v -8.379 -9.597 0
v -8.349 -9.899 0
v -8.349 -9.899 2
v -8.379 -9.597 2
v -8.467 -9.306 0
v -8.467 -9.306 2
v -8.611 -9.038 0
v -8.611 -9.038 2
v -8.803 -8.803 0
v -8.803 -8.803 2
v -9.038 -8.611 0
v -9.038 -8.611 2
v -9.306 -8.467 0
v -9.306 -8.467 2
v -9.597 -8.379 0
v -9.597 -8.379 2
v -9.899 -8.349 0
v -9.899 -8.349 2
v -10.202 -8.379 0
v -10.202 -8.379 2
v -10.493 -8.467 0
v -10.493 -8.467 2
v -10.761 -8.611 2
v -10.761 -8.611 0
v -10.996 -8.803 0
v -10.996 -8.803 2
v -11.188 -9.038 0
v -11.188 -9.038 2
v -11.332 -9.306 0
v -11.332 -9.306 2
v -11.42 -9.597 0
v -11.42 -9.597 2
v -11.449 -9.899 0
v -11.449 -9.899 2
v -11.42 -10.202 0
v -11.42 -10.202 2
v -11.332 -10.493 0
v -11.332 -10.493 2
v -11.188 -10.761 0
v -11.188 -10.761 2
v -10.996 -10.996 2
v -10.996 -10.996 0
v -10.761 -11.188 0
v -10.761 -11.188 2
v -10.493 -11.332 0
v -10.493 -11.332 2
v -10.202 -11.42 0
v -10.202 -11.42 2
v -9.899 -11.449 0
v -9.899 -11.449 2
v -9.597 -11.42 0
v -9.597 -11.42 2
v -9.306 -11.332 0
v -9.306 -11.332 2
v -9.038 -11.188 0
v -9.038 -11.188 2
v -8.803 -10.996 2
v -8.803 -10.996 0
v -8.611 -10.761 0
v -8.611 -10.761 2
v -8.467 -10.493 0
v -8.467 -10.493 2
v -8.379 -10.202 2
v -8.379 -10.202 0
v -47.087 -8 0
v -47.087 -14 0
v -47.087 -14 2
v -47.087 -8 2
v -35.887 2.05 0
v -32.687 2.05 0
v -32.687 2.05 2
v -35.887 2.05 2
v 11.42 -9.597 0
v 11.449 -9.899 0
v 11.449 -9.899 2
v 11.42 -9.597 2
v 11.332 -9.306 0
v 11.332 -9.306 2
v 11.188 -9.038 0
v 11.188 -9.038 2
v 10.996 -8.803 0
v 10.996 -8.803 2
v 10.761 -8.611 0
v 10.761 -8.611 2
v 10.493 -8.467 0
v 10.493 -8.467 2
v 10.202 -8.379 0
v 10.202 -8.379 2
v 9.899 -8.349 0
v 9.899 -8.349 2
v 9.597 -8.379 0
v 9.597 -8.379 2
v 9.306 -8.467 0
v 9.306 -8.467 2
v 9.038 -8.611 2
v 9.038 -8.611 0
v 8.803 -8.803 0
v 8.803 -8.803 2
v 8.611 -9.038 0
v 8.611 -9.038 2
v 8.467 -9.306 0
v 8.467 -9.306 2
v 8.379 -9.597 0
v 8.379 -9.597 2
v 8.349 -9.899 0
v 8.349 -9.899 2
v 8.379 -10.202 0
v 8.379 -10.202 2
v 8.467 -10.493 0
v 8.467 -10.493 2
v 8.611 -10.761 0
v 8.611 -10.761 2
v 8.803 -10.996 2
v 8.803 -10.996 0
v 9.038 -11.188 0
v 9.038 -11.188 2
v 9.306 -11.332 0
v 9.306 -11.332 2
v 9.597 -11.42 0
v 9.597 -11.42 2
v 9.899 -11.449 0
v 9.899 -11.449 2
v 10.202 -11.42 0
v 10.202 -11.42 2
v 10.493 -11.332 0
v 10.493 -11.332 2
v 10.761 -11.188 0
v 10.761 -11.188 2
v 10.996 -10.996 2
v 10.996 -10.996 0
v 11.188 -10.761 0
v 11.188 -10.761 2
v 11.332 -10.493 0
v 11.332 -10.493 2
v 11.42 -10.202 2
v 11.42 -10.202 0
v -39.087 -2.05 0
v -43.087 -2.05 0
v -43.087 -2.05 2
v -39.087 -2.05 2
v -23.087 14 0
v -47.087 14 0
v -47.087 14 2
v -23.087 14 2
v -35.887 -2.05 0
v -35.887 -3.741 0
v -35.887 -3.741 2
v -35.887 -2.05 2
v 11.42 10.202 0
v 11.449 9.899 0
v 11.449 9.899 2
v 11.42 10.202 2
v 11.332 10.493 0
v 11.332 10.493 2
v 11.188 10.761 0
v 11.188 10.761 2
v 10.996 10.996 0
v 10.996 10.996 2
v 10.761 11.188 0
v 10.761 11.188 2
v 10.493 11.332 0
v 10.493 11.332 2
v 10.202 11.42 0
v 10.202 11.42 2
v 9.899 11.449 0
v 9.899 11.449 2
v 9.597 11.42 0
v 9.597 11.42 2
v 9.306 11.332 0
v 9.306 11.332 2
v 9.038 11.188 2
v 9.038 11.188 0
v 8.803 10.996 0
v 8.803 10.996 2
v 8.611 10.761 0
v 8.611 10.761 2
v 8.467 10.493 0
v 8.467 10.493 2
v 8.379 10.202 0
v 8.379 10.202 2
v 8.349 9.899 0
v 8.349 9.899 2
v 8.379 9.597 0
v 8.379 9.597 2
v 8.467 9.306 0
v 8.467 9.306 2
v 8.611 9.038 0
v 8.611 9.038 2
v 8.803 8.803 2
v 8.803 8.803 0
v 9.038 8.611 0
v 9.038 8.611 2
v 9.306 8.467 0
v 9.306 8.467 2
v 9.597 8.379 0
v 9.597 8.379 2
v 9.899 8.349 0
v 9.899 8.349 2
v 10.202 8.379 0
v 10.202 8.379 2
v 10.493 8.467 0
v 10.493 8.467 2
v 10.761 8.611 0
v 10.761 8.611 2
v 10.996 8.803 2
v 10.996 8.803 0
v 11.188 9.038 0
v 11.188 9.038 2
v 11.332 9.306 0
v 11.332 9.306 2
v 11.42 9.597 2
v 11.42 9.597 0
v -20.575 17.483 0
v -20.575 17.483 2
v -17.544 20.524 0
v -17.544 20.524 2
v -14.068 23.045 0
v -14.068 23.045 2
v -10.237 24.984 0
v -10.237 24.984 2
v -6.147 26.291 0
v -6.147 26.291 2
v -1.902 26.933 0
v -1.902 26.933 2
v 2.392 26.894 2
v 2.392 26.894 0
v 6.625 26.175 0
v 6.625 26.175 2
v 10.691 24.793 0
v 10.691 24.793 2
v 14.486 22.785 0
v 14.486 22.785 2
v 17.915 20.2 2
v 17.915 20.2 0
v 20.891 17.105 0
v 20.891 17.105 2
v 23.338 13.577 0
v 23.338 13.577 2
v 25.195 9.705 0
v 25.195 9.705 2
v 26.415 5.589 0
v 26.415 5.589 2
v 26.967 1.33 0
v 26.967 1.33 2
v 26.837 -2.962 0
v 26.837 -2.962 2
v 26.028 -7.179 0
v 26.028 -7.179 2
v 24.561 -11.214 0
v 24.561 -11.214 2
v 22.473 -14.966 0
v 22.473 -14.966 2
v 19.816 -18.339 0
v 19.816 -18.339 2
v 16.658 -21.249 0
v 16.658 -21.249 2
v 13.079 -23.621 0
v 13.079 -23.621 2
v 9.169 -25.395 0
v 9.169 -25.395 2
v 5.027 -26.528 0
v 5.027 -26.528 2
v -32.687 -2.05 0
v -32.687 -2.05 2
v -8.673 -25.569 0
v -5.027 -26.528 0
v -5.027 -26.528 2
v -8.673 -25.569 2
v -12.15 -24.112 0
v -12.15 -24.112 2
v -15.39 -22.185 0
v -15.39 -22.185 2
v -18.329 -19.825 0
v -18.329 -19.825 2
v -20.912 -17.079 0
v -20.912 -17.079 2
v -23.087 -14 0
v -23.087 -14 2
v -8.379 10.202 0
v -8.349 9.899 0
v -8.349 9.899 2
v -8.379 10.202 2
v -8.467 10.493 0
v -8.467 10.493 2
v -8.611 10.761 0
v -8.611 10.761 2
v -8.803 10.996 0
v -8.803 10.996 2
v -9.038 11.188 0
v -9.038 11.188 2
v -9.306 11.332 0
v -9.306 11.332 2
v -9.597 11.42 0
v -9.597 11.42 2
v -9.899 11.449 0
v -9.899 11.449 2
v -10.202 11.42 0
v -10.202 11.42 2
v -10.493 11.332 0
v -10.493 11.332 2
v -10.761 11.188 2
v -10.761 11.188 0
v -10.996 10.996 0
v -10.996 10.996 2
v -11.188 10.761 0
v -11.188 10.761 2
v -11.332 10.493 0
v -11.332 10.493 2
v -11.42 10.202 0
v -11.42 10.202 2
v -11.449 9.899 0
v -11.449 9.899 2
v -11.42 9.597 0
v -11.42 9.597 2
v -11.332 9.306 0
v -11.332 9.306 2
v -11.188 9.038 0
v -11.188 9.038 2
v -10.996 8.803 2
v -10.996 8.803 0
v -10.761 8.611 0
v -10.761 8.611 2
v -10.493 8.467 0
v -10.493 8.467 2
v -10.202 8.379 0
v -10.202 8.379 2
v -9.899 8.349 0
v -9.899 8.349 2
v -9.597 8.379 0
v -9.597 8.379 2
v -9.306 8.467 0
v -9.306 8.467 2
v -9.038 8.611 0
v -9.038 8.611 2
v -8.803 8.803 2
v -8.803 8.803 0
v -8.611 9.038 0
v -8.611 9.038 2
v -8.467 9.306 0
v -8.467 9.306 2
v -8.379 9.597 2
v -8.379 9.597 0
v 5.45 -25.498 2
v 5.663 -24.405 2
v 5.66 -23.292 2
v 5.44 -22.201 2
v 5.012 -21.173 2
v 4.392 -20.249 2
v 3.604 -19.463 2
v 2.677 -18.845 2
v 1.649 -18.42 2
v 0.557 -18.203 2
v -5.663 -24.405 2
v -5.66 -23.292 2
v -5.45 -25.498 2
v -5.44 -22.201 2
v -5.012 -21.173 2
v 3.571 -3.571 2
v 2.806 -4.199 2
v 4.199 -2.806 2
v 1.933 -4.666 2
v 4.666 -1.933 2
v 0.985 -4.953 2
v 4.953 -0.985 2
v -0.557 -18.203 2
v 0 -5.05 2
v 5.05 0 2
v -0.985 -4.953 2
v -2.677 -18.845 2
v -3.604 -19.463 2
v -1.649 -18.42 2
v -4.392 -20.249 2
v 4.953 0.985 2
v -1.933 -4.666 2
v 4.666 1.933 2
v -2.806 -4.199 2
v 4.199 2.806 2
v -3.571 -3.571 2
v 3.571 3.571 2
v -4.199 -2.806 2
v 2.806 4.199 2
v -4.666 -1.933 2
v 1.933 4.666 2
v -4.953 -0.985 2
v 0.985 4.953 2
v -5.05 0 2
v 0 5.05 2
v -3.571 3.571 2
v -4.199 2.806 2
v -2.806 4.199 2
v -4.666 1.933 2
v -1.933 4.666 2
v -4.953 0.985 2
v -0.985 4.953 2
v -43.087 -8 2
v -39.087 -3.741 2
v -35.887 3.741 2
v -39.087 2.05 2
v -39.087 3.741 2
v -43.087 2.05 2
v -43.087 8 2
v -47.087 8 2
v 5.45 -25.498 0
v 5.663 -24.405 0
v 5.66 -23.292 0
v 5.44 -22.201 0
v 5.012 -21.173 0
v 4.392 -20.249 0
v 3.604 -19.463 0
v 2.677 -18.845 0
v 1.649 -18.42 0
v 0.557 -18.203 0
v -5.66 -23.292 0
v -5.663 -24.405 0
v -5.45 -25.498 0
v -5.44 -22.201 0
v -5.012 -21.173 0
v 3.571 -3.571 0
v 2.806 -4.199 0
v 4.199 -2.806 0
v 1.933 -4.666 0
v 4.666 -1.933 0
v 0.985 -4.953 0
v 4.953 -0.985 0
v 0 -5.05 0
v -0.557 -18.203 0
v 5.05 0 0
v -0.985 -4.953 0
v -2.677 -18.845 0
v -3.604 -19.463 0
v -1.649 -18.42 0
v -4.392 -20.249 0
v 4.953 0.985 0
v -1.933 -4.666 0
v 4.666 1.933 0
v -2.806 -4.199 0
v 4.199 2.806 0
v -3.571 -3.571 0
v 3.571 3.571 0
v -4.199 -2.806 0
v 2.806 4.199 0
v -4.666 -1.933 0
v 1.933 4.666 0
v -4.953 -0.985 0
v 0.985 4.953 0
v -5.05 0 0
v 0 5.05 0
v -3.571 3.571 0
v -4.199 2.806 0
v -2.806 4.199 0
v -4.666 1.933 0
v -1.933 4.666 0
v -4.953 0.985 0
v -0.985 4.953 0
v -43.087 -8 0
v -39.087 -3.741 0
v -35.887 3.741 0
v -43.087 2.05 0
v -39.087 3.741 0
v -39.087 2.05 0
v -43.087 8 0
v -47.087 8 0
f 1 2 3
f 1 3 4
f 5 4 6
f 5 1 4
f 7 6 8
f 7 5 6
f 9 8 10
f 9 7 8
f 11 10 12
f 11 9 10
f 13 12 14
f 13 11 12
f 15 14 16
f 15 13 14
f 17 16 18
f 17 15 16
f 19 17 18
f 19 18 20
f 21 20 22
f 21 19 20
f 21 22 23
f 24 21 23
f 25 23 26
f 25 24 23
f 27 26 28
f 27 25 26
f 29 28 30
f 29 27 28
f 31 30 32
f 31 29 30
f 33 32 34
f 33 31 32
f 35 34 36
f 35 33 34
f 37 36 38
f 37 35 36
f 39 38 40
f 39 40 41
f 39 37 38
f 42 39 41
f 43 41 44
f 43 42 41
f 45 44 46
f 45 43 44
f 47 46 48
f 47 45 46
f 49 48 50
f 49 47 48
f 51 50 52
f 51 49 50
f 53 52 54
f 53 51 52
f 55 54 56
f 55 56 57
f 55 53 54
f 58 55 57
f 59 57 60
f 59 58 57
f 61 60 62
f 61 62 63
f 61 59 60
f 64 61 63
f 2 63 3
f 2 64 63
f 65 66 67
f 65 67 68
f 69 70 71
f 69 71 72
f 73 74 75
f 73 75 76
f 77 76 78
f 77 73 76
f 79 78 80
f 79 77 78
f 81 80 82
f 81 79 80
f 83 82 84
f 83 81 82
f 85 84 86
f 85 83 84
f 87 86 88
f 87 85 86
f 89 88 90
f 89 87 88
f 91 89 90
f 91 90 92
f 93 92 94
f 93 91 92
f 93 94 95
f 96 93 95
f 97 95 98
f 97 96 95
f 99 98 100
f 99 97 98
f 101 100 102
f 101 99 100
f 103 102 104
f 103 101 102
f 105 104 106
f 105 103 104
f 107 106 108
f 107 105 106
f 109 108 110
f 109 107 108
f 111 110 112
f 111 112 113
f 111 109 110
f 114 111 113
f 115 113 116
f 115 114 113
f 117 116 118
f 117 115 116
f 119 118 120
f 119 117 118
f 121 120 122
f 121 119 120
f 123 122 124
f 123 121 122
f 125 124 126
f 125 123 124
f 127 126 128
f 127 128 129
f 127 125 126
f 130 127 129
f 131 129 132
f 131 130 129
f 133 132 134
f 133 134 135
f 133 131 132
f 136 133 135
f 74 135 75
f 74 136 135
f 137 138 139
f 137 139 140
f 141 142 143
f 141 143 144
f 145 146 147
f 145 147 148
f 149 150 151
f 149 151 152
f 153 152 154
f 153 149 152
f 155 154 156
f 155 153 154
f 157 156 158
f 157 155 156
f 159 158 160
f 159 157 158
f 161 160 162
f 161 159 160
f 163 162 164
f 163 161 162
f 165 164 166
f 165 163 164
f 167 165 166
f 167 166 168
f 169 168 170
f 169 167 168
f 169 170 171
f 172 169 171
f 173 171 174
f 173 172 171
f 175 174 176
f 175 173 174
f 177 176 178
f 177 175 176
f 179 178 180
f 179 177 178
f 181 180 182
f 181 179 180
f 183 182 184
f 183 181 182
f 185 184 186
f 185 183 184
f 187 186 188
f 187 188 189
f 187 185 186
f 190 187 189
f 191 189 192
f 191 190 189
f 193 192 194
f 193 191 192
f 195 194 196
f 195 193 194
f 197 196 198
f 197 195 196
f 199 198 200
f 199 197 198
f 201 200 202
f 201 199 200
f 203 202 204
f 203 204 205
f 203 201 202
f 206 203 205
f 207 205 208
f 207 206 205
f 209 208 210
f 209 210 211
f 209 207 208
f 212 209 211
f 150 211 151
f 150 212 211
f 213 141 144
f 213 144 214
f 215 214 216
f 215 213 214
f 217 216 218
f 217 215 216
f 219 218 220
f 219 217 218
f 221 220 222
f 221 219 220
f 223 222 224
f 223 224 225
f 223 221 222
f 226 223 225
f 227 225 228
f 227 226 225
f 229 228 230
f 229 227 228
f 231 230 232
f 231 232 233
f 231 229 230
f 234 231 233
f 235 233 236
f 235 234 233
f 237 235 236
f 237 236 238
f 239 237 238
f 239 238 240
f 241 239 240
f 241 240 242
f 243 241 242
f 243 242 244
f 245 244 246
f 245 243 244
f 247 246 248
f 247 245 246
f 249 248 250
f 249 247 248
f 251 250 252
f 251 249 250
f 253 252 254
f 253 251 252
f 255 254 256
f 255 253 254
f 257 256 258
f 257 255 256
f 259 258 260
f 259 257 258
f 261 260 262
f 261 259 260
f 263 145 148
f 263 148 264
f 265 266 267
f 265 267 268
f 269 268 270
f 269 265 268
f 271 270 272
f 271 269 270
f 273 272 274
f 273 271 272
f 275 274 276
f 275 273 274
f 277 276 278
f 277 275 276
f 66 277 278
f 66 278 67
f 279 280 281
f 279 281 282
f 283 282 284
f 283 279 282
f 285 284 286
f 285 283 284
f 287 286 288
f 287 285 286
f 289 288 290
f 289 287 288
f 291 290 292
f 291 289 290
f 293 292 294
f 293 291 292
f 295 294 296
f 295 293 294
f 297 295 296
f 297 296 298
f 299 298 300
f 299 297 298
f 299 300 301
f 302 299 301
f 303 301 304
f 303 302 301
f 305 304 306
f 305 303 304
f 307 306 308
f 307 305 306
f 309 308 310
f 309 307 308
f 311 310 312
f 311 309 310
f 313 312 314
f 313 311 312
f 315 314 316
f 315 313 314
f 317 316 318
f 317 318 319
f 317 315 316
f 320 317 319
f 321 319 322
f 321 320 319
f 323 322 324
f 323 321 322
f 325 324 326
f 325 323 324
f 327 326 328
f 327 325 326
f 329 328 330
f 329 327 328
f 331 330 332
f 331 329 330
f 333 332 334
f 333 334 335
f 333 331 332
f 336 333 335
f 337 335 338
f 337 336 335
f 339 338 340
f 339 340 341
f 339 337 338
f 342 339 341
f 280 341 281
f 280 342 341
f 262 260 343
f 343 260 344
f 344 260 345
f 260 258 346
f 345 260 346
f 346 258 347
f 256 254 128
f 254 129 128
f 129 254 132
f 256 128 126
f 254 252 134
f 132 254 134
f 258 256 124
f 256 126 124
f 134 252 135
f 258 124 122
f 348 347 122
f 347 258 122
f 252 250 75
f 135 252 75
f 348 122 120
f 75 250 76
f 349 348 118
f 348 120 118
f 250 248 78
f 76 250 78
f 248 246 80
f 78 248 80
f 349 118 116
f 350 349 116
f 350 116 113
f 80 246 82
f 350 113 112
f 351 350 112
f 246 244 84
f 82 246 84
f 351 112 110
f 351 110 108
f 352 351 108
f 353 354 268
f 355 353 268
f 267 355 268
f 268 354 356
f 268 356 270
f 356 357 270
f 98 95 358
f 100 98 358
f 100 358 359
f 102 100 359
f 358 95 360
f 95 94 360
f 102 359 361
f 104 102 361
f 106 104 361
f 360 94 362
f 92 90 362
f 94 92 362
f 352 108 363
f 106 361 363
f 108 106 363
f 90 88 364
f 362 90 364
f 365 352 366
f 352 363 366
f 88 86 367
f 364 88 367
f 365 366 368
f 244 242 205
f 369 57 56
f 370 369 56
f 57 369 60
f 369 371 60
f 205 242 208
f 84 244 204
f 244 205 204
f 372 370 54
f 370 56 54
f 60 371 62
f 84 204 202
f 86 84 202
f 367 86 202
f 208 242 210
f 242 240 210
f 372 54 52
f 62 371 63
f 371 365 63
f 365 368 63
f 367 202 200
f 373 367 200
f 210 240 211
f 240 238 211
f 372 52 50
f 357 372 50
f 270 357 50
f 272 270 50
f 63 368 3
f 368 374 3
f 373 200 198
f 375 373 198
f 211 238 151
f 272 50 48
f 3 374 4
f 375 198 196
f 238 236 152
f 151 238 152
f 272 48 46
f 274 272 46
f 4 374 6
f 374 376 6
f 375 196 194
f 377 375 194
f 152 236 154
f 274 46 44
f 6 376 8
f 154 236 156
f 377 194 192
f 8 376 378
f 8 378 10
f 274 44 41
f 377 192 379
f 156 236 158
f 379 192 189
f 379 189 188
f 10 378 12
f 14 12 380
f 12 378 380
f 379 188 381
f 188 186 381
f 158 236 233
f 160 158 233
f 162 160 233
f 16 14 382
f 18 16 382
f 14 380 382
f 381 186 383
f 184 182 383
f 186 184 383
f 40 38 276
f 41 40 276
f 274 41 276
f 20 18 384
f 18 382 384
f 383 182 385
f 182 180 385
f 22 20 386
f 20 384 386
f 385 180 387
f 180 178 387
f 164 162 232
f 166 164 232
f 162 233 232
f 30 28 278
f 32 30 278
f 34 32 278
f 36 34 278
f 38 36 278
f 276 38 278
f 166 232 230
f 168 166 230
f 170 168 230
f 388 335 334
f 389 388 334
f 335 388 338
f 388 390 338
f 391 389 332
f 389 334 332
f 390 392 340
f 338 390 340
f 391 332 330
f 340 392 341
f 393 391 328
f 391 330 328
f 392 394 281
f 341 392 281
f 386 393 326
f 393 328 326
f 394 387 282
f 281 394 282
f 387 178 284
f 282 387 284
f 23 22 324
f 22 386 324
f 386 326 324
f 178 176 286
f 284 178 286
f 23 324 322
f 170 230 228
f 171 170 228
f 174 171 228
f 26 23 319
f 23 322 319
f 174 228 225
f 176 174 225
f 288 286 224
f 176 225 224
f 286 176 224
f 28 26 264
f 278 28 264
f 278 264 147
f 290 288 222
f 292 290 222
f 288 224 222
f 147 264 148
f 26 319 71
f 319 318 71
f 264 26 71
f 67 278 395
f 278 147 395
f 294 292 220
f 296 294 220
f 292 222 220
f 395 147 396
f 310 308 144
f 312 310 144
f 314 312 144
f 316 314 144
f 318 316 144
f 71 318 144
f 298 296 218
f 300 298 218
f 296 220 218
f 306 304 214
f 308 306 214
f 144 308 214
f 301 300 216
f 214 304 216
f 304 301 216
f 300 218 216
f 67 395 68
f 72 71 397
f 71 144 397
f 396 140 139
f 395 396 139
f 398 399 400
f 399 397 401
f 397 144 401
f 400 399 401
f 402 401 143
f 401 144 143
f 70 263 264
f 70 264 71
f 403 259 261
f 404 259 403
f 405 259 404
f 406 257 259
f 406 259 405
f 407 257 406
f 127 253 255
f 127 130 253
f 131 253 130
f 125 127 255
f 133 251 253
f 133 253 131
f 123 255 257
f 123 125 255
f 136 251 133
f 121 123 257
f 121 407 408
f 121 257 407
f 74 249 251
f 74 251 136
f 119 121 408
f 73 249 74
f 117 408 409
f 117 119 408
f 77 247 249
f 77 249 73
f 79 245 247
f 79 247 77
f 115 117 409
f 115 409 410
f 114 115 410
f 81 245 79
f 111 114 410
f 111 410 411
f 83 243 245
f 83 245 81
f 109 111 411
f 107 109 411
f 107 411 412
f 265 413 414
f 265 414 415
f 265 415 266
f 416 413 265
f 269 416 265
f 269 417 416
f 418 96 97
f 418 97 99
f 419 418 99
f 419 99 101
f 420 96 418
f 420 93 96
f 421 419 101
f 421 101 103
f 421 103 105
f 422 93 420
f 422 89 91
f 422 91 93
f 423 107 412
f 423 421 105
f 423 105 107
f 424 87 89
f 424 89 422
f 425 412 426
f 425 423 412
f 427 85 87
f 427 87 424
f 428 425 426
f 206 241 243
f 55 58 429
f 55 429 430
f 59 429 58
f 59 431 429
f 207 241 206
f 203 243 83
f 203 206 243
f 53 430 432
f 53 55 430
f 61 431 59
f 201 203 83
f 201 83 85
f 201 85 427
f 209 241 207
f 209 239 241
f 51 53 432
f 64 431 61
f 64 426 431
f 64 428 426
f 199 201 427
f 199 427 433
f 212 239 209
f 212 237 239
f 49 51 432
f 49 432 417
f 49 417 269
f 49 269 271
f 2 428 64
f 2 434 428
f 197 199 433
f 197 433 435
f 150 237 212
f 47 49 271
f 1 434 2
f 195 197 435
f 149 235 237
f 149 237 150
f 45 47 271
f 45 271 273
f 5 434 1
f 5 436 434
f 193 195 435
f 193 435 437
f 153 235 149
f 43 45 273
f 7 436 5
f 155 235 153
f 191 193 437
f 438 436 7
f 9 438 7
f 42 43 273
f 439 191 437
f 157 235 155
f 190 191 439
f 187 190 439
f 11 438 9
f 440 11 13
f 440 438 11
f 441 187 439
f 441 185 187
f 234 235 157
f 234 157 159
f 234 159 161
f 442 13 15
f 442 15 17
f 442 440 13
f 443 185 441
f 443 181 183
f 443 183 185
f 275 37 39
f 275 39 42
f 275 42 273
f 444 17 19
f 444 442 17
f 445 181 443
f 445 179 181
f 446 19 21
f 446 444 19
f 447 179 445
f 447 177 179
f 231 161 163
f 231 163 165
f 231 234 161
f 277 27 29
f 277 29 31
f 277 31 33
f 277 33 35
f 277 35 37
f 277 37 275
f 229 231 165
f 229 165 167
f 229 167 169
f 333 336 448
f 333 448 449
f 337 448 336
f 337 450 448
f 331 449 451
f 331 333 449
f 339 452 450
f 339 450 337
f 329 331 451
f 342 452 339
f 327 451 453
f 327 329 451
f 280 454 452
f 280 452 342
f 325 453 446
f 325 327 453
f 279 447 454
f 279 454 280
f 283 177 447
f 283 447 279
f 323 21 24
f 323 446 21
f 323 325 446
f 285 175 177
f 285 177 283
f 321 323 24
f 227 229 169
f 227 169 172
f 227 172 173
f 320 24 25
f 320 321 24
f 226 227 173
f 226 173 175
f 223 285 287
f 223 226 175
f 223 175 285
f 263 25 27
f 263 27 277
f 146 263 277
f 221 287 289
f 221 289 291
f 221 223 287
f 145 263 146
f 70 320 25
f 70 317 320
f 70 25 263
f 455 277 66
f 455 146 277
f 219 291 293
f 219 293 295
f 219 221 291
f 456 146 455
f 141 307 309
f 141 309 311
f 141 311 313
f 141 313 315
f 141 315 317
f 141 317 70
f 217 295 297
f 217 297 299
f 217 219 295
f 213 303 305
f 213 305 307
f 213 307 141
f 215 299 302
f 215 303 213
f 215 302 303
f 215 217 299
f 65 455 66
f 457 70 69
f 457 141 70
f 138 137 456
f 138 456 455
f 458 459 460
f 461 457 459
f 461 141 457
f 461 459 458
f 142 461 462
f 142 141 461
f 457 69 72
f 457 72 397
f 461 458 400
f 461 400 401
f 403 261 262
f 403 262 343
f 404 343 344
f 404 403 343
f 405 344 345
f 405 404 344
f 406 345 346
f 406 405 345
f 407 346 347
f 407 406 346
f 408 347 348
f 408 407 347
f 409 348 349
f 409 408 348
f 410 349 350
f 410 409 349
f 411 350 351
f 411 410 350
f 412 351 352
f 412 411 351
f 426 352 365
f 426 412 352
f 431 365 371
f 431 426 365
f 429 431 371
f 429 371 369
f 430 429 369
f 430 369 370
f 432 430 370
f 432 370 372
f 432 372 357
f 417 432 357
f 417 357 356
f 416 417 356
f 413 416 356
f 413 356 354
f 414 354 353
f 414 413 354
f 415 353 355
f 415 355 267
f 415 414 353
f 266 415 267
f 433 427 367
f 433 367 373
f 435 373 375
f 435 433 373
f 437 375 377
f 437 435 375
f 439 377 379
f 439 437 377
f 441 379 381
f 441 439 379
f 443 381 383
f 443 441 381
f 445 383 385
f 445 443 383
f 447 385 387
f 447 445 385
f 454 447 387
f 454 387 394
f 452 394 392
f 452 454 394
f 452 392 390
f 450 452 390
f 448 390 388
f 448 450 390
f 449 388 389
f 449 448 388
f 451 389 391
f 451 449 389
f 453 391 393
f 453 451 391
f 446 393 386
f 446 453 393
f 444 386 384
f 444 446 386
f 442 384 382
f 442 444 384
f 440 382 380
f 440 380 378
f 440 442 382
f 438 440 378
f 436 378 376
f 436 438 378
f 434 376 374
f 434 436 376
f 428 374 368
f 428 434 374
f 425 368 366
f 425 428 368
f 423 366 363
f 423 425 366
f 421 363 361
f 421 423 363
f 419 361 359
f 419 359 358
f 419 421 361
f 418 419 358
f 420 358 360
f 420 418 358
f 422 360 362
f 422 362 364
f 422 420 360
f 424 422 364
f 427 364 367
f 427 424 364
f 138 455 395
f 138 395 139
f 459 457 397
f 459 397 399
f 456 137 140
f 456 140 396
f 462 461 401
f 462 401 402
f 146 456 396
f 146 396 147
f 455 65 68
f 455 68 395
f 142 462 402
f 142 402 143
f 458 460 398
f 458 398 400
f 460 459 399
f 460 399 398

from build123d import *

# Parameters (mm, degrees)
SKETCH_1_R      = 5.05
SKETCH_1_R_2    = 1.55
EXTRUDE_1_DEPTH = 2


with BuildPart() as part:
    # 草图1 → 凸台-拉伸1 (new body)
    with BuildSketch(Plane.XY):
        with BuildLine():
            Line((-23.086792761, -14), (-43.086792761, -14))
            Line((-43.086792761, -14), (-47.086792761, -14))
            Line((-47.086792761, -14), (-47.086792761, -8))
            Line((-47.086792761, -8), (-43.086792761, -8))
            Line((-43.086792761, -8), (-43.086792761, -2.05))
            Line((-43.086792761, -2.05), (-39.086792761, -2.05))
            Line((-39.086792761, -2.05), (-39.086792761, -3.741370628))
            Line((-39.086792761, -3.741370628), (-35.886792761, -3.741370628))
            Line((-35.886792761, -3.741370628), (-35.886792761, -2.05))
            Line((-35.886792761, -2.05), (-32.686792761, -2.05))
            Line((-32.686792761, -2.05), (-32.686792761, 2.05))
            Line((-32.686792761, 2.05), (-35.886792761, 2.05))
            Line((-35.886792761, 2.05), (-35.886792761, 3.741370628))
            Line((-35.886792761, 3.741370628), (-39.086792761, 3.741370628))
            Line((-39.086792761, 3.741370628), (-39.086792761, 2.05))
            Line((-39.086792761, 2.05), (-43.086792761, 2.05))
            Line((-43.086792761, 2.05), (-43.086792761, 8))
            Line((-43.086792761, 8), (-47.086792761, 8))
            Line((-47.086792761, 8), (-47.086792761, 14))
            Line((-47.086792761, 14), (-43.086792761, 14))
            Line((-43.086792761, 14), (-23.086792761, 14))
            ThreePointArc((-23.086792761, 14), (22.184698295, 15.389579642), (5.027449154, -26.527810973))
            ThreePointArc((5.027449154, -26.527810973), (0, -18.175825951), (-5.027449154, -26.527810973))
            ThreePointArc((-5.027449154, -26.527810973), (-15.389579642, -22.184698295), (-23.086792761, -14))
        make_face()
        Circle(SKETCH_1_R, mode=Mode.SUBTRACT)
        with Locations((-9.899494937, -9.899494937)):
            Circle(SKETCH_1_R_2, mode=Mode.SUBTRACT)
        with Locations((-9.899494937, 9.899494937)):
            Circle(SKETCH_1_R_2, mode=Mode.SUBTRACT)
        with Locations((9.899494937, 9.899494937)):
            Circle(SKETCH_1_R_2, mode=Mode.SUBTRACT)
        with Locations((9.899494937, -9.899494937)):
            Circle(SKETCH_1_R_2, mode=Mode.SUBTRACT)
    extrude(amount=EXTRUDE_1_DEPTH)


solid = part.part
